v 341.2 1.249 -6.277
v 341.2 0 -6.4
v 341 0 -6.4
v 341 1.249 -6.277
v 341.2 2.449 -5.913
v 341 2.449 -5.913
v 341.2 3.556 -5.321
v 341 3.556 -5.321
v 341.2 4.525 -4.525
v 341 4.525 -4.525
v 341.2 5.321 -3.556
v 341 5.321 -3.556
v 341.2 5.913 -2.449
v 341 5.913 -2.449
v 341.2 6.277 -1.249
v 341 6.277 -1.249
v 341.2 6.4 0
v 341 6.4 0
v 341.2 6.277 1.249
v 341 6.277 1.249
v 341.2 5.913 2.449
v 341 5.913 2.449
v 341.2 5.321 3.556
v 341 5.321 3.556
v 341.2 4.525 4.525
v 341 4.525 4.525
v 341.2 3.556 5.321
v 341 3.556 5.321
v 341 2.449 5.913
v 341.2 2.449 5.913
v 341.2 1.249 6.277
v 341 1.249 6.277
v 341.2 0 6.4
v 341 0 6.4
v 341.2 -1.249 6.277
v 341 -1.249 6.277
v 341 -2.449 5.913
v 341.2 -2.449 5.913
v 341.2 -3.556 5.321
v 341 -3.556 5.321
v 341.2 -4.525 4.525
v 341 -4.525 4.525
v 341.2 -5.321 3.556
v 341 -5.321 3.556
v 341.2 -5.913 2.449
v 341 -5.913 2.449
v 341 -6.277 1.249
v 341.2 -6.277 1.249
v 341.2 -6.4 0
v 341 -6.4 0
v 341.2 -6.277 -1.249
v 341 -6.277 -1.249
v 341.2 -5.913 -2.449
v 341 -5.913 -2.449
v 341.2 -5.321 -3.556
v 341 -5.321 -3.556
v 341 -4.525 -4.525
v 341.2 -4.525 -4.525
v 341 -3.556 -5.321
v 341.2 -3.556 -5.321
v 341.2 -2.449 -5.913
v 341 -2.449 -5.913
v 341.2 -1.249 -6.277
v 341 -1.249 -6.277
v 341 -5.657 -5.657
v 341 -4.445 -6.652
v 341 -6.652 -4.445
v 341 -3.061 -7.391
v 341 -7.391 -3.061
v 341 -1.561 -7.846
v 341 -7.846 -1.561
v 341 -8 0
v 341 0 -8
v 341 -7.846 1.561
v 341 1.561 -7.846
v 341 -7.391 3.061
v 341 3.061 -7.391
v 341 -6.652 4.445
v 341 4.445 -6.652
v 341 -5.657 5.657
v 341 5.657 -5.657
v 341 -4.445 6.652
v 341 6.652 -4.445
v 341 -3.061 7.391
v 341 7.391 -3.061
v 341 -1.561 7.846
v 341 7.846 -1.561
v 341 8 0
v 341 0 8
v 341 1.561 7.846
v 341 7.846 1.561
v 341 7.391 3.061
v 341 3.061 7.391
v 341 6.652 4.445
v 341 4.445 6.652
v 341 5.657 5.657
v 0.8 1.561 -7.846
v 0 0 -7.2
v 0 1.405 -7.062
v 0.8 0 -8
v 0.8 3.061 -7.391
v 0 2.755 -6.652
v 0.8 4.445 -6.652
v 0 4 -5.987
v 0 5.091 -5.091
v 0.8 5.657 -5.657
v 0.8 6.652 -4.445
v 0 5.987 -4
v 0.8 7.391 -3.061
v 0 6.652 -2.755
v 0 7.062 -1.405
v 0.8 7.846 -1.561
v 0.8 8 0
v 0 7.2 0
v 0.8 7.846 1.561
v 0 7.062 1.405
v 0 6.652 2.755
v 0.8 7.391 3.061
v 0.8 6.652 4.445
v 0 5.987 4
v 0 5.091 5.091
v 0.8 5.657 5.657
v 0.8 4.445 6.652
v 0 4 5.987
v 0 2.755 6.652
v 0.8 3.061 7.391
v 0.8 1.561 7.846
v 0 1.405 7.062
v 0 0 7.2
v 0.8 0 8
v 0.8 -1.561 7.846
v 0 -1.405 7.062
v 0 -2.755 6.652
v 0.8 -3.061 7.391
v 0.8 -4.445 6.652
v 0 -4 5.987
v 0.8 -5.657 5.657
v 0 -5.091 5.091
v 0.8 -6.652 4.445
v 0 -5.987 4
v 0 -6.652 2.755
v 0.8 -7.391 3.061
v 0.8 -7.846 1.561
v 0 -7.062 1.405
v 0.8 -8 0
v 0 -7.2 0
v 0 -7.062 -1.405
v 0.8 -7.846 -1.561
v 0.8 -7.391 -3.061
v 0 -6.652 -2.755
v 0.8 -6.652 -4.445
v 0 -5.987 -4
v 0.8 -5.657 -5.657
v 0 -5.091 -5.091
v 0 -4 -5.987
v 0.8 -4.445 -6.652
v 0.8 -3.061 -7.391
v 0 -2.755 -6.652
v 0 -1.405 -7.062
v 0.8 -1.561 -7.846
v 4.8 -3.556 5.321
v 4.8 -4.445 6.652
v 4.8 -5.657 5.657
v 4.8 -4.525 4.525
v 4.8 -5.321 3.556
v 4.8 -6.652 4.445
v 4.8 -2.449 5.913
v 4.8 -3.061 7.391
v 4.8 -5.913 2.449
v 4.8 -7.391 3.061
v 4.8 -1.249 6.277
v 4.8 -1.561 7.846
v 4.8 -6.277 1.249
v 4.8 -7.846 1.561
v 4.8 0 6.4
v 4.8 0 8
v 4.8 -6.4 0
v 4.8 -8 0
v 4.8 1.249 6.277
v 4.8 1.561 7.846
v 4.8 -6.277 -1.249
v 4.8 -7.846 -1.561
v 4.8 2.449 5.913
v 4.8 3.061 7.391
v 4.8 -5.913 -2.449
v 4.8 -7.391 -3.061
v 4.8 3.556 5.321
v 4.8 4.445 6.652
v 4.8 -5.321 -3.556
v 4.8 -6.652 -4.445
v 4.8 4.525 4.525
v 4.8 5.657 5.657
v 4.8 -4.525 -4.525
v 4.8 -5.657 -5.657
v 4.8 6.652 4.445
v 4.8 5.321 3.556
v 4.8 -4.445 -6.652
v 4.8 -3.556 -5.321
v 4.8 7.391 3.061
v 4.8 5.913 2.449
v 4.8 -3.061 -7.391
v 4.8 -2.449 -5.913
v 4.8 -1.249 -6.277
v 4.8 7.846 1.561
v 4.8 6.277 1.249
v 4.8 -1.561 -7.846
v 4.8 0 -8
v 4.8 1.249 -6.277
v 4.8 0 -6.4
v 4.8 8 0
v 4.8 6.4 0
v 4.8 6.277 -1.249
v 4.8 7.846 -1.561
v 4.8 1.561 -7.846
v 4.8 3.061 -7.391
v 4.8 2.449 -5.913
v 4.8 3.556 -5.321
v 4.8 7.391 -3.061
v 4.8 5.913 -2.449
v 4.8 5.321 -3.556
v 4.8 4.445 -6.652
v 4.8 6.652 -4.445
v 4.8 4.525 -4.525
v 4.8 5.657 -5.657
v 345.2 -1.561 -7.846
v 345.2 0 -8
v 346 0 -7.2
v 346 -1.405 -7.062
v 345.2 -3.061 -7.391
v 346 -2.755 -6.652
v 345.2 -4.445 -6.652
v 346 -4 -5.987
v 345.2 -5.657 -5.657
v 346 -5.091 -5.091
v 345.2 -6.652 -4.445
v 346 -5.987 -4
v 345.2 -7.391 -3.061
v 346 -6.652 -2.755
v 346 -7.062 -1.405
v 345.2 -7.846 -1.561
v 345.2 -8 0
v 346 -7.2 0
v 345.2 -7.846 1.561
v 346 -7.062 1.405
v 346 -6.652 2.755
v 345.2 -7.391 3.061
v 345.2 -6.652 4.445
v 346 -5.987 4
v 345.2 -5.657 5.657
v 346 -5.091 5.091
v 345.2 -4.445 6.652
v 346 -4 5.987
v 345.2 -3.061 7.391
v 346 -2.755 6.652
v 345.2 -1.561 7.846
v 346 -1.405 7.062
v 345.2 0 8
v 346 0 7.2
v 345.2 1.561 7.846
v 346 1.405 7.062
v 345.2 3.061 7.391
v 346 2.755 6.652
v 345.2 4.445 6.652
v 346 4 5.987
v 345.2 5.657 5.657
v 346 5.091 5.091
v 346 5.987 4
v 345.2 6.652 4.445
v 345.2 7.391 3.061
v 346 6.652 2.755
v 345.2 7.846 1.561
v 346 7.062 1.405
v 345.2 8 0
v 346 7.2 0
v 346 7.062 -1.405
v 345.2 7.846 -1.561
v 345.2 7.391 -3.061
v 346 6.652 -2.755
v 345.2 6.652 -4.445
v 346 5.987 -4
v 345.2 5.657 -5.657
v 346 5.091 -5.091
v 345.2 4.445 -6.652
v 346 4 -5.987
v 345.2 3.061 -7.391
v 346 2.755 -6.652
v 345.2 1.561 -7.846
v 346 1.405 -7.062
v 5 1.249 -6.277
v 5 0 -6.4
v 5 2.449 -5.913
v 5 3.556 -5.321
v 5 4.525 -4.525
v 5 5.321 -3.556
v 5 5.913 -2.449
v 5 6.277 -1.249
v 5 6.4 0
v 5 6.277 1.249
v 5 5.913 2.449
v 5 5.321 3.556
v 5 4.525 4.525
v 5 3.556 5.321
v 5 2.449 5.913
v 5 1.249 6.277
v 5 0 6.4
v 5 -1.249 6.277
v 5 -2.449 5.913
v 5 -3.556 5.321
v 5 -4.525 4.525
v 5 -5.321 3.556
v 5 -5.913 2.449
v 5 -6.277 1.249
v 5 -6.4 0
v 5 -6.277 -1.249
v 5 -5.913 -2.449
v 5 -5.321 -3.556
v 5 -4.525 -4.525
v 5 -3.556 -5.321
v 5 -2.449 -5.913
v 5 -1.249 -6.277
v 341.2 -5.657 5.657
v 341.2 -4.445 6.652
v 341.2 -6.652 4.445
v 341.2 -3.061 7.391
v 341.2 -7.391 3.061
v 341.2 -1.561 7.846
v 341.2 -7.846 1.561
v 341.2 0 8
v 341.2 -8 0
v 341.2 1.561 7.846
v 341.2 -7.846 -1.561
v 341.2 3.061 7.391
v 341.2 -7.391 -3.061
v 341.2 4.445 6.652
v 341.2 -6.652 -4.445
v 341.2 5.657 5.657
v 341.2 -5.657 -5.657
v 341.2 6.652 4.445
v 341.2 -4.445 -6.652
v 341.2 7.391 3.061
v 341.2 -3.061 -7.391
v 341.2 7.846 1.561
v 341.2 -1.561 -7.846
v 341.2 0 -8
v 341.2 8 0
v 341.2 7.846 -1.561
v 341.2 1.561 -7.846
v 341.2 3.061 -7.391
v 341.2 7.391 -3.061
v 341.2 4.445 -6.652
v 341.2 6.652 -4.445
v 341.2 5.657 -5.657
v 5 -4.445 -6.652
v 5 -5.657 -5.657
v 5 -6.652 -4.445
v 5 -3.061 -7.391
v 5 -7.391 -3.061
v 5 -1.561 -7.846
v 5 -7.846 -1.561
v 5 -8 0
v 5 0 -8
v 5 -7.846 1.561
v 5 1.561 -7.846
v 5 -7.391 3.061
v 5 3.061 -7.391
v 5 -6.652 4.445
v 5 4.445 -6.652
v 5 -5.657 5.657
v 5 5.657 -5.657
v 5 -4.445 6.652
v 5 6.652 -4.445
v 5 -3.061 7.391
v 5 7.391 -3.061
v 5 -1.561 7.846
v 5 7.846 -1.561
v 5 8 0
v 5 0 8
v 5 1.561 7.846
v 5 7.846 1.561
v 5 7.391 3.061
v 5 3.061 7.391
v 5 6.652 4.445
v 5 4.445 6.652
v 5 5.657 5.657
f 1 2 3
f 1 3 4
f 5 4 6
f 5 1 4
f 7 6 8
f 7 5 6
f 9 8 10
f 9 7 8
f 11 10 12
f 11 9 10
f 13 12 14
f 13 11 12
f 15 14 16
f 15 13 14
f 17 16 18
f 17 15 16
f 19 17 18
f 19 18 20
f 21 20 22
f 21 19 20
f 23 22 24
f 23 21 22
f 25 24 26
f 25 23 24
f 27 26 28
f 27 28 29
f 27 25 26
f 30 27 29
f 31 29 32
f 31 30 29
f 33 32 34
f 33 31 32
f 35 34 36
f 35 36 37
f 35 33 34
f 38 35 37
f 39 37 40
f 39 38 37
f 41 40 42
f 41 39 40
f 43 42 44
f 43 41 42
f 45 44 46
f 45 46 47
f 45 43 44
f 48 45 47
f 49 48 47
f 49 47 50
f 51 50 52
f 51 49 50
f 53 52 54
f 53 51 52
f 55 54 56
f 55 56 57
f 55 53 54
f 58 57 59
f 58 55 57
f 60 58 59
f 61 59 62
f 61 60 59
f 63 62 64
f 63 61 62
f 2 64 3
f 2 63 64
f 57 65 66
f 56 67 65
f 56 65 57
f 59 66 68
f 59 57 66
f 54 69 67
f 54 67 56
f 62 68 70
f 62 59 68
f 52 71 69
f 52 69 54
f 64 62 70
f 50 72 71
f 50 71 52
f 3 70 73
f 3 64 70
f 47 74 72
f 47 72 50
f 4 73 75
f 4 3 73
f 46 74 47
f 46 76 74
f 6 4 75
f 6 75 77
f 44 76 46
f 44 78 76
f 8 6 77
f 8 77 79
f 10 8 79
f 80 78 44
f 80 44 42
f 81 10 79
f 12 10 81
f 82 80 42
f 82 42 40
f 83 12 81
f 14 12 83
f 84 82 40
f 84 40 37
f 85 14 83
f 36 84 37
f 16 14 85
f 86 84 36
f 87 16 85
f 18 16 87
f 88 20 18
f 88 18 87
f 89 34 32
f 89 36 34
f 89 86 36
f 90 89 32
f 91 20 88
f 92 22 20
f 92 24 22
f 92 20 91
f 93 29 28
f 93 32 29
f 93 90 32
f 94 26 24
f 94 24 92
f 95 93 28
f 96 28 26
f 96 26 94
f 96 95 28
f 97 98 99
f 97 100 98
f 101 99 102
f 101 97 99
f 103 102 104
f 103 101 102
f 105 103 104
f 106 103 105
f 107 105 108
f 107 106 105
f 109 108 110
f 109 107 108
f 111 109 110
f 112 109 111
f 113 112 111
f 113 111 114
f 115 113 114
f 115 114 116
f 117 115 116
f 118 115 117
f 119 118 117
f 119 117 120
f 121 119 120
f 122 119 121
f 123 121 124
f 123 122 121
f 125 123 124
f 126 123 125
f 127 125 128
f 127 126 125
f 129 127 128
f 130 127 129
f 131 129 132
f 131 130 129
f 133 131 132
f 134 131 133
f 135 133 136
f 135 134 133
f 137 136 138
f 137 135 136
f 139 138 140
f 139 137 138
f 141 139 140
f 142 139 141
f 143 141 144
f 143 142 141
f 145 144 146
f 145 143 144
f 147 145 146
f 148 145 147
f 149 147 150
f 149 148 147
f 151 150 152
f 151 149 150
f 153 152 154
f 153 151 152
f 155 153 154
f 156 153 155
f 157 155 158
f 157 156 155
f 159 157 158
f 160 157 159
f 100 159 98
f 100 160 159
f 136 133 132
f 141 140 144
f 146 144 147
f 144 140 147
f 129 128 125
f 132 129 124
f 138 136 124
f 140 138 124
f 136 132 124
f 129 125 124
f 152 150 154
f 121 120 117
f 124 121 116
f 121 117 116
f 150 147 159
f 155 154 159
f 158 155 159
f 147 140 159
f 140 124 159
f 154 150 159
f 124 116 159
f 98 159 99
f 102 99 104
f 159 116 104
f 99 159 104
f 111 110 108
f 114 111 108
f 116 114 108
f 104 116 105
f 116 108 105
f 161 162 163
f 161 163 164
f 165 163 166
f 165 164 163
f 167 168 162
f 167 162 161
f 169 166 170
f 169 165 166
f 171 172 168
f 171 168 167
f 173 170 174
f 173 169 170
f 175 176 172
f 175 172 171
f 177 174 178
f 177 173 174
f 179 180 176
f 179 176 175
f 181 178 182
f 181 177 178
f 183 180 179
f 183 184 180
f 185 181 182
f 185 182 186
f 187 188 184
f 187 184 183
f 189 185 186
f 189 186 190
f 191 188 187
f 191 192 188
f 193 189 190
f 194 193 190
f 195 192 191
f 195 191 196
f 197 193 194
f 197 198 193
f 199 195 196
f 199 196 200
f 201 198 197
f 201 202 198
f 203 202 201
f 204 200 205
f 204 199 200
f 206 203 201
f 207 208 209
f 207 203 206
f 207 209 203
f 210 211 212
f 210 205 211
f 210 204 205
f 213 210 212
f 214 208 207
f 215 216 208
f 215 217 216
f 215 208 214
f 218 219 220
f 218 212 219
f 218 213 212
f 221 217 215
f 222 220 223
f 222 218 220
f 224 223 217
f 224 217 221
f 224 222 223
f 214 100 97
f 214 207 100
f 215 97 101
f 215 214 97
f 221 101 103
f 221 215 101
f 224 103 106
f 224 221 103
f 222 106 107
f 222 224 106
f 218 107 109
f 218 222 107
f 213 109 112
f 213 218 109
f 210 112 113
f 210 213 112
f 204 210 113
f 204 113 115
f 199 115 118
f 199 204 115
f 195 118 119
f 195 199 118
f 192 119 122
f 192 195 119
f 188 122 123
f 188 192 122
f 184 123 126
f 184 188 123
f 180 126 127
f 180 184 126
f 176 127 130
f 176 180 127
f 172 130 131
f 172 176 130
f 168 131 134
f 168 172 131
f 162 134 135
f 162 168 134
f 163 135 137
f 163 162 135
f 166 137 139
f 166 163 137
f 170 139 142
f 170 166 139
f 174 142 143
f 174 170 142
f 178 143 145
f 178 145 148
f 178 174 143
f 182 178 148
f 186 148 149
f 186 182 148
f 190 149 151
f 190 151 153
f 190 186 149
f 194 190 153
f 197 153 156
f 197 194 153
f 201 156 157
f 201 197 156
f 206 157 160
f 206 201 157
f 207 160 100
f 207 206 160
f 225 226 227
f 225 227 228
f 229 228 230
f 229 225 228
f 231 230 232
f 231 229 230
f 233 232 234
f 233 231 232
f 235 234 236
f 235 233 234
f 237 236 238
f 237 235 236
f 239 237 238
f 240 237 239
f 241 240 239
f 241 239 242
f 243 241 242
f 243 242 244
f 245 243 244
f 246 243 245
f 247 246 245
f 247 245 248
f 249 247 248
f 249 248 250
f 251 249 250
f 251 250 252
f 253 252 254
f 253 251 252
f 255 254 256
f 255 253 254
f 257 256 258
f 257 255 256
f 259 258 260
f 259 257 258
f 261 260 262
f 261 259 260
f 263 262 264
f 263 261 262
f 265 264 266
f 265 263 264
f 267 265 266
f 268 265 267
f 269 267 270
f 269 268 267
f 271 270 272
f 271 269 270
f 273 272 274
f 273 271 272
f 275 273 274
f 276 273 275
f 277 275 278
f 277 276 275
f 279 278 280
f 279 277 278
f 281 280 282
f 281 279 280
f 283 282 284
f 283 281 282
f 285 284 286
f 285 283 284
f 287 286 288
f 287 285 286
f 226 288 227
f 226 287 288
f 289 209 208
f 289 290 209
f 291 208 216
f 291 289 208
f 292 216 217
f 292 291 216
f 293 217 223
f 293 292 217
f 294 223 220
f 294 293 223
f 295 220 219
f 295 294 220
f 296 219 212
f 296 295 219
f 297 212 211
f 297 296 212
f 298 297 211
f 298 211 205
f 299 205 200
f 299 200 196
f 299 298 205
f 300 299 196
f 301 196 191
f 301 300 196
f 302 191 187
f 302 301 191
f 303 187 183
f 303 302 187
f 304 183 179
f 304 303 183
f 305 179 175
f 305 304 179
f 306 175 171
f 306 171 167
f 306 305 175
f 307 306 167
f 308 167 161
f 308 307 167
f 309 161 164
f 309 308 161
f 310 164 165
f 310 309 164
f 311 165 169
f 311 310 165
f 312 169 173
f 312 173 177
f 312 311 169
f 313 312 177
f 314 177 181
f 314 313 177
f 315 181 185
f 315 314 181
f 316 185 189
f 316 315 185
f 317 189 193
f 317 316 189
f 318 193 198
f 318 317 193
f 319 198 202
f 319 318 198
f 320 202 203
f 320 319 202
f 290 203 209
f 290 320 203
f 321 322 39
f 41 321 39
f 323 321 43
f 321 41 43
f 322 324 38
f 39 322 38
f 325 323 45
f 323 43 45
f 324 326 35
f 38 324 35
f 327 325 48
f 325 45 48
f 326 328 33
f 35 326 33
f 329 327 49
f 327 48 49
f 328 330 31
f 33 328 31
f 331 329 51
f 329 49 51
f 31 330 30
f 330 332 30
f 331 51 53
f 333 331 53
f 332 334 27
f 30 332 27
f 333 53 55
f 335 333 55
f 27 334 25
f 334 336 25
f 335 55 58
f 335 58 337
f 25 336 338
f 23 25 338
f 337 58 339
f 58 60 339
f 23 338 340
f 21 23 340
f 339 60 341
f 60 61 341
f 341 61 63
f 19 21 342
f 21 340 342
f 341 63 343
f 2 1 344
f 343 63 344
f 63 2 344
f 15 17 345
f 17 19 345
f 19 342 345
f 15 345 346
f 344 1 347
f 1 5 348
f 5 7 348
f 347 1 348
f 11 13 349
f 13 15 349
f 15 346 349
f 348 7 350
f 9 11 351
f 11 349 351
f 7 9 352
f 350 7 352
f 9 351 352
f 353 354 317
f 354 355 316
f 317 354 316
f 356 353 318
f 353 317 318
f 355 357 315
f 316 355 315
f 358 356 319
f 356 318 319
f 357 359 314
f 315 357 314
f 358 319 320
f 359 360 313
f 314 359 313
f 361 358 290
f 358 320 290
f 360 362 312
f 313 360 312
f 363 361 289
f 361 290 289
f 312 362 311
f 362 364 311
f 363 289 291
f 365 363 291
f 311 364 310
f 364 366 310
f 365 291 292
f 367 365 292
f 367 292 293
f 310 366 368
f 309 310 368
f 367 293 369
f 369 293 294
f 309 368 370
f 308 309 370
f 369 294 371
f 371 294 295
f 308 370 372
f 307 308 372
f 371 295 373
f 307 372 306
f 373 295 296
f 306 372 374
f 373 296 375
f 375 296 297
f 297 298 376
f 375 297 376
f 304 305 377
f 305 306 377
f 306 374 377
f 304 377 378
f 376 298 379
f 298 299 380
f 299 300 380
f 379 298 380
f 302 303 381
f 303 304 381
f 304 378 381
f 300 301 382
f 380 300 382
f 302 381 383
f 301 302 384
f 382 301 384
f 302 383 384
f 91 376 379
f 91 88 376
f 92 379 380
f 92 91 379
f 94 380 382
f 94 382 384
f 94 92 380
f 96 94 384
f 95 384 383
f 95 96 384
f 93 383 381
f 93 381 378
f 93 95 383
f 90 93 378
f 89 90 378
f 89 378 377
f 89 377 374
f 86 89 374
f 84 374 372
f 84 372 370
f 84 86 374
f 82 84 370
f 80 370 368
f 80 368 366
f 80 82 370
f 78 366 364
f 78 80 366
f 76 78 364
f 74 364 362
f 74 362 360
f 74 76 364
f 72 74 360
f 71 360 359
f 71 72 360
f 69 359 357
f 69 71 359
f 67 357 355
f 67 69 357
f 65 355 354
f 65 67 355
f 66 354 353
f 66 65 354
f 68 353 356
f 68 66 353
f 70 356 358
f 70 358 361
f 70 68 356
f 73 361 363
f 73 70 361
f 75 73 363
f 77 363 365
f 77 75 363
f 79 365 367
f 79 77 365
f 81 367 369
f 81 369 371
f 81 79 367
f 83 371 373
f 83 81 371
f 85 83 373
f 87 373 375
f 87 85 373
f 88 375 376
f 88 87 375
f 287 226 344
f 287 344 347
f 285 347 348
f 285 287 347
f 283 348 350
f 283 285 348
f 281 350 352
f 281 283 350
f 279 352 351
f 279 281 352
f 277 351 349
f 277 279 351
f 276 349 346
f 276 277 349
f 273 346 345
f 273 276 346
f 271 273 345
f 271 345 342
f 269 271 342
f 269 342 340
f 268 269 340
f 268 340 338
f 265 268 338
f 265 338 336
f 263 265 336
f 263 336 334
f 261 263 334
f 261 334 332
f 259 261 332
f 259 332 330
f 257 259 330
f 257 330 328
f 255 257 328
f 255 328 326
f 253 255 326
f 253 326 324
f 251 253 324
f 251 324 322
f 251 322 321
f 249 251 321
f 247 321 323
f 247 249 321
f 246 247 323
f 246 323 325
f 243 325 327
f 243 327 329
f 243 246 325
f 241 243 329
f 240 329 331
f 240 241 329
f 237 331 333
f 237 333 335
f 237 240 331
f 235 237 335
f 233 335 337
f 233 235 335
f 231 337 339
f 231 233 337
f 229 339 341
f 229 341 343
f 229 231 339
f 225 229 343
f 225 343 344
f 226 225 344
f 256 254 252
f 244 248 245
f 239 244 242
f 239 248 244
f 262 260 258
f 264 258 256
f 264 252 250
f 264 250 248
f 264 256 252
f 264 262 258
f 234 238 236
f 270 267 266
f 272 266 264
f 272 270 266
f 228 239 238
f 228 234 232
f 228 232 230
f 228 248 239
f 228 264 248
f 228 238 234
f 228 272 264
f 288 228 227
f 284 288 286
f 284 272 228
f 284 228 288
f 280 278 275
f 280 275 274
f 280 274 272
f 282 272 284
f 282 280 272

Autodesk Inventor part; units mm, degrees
sketch "Sketch_1" plane through (0, 0, 0) normal (0, 0, 1) x (1, 0, 0)
  line L0 (341, 0) -> (5, 0)
  line L1 (5, 0) -> (5, 8)
  line L2 (5, 8) -> (341, 8)
  line L3 (341, 8) -> (341, 0)
  line L4 (341, 0) -> (5, 0)
revolve "Revolution1" add sketch "Sketch_1" angle 360 about axis through (341, 0, 0) along (1, 0, 0)
thread "Thread1" size "M16x2" class "6g" standard "ISO Metric profile" full length
sketch "Sketch_2" plane through (0, 0, 0) normal (0, 1, 0) x (-1, 0, 0)
  line L0 (-5, 0) -> (0, 0)
  line L1 (0, 0) -> (0, -7.2)
  line L2 (0, -7.2) -> (-0.8, -8)
  line L3 (-0.8, -8) -> (-4.8, -8)
  line L4 (-4.8, -8) -> (-4.8, -6.4)
  line L5 (-4.8, -6.4) -> (-5, -6.4)
  line L6 (-5, -6.4) -> (-5, 0)
  line L7 (-5, 0) -> (0, 0)
revolve "Revolution2" add sketch "Sketch_2" angle 360 about axis through (5, 0, 0) along (1, 0, 0)
sketch "Sketch_3" plane through (0, 0, 0) normal (0, 1, 0) x (-1, 0, 0)
  line L0 (-346, 0) -> (-341, 0)
  line L1 (-341, 0) -> (-341, -6.4)
  line L2 (-341, -6.4) -> (-341.2, -6.4)
  line L3 (-341.2, -6.4) -> (-341.2, -8)
  line L4 (-341.2, -8) -> (-345.2, -8)
  line L5 (-345.2, -8) -> (-346, -7.2)
  line L6 (-346, -7.2) -> (-346, 0)
  line L7 (-346, 0) -> (-341, 0)
revolve "Revolution3" add sketch "Sketch_3" angle 360 about axis through (346, 0, 0) along (1, 0, 0)
ref_plane "bnt_s_1_XY" through (0, 0, 0) normal (-1, 0, 0) x (0, 0, -1)
ref_plane "bnt_s_1_YZ" through (0, 0, 0) normal (0, 0, -1) x (0, -1, 0)
ref_plane "bnt_s_1_ZX" through (0, 0, 0) normal (0, -1, 0) x (-1, 0, 0)
properties part number "BNT 1605-2.6300 Shaft"
